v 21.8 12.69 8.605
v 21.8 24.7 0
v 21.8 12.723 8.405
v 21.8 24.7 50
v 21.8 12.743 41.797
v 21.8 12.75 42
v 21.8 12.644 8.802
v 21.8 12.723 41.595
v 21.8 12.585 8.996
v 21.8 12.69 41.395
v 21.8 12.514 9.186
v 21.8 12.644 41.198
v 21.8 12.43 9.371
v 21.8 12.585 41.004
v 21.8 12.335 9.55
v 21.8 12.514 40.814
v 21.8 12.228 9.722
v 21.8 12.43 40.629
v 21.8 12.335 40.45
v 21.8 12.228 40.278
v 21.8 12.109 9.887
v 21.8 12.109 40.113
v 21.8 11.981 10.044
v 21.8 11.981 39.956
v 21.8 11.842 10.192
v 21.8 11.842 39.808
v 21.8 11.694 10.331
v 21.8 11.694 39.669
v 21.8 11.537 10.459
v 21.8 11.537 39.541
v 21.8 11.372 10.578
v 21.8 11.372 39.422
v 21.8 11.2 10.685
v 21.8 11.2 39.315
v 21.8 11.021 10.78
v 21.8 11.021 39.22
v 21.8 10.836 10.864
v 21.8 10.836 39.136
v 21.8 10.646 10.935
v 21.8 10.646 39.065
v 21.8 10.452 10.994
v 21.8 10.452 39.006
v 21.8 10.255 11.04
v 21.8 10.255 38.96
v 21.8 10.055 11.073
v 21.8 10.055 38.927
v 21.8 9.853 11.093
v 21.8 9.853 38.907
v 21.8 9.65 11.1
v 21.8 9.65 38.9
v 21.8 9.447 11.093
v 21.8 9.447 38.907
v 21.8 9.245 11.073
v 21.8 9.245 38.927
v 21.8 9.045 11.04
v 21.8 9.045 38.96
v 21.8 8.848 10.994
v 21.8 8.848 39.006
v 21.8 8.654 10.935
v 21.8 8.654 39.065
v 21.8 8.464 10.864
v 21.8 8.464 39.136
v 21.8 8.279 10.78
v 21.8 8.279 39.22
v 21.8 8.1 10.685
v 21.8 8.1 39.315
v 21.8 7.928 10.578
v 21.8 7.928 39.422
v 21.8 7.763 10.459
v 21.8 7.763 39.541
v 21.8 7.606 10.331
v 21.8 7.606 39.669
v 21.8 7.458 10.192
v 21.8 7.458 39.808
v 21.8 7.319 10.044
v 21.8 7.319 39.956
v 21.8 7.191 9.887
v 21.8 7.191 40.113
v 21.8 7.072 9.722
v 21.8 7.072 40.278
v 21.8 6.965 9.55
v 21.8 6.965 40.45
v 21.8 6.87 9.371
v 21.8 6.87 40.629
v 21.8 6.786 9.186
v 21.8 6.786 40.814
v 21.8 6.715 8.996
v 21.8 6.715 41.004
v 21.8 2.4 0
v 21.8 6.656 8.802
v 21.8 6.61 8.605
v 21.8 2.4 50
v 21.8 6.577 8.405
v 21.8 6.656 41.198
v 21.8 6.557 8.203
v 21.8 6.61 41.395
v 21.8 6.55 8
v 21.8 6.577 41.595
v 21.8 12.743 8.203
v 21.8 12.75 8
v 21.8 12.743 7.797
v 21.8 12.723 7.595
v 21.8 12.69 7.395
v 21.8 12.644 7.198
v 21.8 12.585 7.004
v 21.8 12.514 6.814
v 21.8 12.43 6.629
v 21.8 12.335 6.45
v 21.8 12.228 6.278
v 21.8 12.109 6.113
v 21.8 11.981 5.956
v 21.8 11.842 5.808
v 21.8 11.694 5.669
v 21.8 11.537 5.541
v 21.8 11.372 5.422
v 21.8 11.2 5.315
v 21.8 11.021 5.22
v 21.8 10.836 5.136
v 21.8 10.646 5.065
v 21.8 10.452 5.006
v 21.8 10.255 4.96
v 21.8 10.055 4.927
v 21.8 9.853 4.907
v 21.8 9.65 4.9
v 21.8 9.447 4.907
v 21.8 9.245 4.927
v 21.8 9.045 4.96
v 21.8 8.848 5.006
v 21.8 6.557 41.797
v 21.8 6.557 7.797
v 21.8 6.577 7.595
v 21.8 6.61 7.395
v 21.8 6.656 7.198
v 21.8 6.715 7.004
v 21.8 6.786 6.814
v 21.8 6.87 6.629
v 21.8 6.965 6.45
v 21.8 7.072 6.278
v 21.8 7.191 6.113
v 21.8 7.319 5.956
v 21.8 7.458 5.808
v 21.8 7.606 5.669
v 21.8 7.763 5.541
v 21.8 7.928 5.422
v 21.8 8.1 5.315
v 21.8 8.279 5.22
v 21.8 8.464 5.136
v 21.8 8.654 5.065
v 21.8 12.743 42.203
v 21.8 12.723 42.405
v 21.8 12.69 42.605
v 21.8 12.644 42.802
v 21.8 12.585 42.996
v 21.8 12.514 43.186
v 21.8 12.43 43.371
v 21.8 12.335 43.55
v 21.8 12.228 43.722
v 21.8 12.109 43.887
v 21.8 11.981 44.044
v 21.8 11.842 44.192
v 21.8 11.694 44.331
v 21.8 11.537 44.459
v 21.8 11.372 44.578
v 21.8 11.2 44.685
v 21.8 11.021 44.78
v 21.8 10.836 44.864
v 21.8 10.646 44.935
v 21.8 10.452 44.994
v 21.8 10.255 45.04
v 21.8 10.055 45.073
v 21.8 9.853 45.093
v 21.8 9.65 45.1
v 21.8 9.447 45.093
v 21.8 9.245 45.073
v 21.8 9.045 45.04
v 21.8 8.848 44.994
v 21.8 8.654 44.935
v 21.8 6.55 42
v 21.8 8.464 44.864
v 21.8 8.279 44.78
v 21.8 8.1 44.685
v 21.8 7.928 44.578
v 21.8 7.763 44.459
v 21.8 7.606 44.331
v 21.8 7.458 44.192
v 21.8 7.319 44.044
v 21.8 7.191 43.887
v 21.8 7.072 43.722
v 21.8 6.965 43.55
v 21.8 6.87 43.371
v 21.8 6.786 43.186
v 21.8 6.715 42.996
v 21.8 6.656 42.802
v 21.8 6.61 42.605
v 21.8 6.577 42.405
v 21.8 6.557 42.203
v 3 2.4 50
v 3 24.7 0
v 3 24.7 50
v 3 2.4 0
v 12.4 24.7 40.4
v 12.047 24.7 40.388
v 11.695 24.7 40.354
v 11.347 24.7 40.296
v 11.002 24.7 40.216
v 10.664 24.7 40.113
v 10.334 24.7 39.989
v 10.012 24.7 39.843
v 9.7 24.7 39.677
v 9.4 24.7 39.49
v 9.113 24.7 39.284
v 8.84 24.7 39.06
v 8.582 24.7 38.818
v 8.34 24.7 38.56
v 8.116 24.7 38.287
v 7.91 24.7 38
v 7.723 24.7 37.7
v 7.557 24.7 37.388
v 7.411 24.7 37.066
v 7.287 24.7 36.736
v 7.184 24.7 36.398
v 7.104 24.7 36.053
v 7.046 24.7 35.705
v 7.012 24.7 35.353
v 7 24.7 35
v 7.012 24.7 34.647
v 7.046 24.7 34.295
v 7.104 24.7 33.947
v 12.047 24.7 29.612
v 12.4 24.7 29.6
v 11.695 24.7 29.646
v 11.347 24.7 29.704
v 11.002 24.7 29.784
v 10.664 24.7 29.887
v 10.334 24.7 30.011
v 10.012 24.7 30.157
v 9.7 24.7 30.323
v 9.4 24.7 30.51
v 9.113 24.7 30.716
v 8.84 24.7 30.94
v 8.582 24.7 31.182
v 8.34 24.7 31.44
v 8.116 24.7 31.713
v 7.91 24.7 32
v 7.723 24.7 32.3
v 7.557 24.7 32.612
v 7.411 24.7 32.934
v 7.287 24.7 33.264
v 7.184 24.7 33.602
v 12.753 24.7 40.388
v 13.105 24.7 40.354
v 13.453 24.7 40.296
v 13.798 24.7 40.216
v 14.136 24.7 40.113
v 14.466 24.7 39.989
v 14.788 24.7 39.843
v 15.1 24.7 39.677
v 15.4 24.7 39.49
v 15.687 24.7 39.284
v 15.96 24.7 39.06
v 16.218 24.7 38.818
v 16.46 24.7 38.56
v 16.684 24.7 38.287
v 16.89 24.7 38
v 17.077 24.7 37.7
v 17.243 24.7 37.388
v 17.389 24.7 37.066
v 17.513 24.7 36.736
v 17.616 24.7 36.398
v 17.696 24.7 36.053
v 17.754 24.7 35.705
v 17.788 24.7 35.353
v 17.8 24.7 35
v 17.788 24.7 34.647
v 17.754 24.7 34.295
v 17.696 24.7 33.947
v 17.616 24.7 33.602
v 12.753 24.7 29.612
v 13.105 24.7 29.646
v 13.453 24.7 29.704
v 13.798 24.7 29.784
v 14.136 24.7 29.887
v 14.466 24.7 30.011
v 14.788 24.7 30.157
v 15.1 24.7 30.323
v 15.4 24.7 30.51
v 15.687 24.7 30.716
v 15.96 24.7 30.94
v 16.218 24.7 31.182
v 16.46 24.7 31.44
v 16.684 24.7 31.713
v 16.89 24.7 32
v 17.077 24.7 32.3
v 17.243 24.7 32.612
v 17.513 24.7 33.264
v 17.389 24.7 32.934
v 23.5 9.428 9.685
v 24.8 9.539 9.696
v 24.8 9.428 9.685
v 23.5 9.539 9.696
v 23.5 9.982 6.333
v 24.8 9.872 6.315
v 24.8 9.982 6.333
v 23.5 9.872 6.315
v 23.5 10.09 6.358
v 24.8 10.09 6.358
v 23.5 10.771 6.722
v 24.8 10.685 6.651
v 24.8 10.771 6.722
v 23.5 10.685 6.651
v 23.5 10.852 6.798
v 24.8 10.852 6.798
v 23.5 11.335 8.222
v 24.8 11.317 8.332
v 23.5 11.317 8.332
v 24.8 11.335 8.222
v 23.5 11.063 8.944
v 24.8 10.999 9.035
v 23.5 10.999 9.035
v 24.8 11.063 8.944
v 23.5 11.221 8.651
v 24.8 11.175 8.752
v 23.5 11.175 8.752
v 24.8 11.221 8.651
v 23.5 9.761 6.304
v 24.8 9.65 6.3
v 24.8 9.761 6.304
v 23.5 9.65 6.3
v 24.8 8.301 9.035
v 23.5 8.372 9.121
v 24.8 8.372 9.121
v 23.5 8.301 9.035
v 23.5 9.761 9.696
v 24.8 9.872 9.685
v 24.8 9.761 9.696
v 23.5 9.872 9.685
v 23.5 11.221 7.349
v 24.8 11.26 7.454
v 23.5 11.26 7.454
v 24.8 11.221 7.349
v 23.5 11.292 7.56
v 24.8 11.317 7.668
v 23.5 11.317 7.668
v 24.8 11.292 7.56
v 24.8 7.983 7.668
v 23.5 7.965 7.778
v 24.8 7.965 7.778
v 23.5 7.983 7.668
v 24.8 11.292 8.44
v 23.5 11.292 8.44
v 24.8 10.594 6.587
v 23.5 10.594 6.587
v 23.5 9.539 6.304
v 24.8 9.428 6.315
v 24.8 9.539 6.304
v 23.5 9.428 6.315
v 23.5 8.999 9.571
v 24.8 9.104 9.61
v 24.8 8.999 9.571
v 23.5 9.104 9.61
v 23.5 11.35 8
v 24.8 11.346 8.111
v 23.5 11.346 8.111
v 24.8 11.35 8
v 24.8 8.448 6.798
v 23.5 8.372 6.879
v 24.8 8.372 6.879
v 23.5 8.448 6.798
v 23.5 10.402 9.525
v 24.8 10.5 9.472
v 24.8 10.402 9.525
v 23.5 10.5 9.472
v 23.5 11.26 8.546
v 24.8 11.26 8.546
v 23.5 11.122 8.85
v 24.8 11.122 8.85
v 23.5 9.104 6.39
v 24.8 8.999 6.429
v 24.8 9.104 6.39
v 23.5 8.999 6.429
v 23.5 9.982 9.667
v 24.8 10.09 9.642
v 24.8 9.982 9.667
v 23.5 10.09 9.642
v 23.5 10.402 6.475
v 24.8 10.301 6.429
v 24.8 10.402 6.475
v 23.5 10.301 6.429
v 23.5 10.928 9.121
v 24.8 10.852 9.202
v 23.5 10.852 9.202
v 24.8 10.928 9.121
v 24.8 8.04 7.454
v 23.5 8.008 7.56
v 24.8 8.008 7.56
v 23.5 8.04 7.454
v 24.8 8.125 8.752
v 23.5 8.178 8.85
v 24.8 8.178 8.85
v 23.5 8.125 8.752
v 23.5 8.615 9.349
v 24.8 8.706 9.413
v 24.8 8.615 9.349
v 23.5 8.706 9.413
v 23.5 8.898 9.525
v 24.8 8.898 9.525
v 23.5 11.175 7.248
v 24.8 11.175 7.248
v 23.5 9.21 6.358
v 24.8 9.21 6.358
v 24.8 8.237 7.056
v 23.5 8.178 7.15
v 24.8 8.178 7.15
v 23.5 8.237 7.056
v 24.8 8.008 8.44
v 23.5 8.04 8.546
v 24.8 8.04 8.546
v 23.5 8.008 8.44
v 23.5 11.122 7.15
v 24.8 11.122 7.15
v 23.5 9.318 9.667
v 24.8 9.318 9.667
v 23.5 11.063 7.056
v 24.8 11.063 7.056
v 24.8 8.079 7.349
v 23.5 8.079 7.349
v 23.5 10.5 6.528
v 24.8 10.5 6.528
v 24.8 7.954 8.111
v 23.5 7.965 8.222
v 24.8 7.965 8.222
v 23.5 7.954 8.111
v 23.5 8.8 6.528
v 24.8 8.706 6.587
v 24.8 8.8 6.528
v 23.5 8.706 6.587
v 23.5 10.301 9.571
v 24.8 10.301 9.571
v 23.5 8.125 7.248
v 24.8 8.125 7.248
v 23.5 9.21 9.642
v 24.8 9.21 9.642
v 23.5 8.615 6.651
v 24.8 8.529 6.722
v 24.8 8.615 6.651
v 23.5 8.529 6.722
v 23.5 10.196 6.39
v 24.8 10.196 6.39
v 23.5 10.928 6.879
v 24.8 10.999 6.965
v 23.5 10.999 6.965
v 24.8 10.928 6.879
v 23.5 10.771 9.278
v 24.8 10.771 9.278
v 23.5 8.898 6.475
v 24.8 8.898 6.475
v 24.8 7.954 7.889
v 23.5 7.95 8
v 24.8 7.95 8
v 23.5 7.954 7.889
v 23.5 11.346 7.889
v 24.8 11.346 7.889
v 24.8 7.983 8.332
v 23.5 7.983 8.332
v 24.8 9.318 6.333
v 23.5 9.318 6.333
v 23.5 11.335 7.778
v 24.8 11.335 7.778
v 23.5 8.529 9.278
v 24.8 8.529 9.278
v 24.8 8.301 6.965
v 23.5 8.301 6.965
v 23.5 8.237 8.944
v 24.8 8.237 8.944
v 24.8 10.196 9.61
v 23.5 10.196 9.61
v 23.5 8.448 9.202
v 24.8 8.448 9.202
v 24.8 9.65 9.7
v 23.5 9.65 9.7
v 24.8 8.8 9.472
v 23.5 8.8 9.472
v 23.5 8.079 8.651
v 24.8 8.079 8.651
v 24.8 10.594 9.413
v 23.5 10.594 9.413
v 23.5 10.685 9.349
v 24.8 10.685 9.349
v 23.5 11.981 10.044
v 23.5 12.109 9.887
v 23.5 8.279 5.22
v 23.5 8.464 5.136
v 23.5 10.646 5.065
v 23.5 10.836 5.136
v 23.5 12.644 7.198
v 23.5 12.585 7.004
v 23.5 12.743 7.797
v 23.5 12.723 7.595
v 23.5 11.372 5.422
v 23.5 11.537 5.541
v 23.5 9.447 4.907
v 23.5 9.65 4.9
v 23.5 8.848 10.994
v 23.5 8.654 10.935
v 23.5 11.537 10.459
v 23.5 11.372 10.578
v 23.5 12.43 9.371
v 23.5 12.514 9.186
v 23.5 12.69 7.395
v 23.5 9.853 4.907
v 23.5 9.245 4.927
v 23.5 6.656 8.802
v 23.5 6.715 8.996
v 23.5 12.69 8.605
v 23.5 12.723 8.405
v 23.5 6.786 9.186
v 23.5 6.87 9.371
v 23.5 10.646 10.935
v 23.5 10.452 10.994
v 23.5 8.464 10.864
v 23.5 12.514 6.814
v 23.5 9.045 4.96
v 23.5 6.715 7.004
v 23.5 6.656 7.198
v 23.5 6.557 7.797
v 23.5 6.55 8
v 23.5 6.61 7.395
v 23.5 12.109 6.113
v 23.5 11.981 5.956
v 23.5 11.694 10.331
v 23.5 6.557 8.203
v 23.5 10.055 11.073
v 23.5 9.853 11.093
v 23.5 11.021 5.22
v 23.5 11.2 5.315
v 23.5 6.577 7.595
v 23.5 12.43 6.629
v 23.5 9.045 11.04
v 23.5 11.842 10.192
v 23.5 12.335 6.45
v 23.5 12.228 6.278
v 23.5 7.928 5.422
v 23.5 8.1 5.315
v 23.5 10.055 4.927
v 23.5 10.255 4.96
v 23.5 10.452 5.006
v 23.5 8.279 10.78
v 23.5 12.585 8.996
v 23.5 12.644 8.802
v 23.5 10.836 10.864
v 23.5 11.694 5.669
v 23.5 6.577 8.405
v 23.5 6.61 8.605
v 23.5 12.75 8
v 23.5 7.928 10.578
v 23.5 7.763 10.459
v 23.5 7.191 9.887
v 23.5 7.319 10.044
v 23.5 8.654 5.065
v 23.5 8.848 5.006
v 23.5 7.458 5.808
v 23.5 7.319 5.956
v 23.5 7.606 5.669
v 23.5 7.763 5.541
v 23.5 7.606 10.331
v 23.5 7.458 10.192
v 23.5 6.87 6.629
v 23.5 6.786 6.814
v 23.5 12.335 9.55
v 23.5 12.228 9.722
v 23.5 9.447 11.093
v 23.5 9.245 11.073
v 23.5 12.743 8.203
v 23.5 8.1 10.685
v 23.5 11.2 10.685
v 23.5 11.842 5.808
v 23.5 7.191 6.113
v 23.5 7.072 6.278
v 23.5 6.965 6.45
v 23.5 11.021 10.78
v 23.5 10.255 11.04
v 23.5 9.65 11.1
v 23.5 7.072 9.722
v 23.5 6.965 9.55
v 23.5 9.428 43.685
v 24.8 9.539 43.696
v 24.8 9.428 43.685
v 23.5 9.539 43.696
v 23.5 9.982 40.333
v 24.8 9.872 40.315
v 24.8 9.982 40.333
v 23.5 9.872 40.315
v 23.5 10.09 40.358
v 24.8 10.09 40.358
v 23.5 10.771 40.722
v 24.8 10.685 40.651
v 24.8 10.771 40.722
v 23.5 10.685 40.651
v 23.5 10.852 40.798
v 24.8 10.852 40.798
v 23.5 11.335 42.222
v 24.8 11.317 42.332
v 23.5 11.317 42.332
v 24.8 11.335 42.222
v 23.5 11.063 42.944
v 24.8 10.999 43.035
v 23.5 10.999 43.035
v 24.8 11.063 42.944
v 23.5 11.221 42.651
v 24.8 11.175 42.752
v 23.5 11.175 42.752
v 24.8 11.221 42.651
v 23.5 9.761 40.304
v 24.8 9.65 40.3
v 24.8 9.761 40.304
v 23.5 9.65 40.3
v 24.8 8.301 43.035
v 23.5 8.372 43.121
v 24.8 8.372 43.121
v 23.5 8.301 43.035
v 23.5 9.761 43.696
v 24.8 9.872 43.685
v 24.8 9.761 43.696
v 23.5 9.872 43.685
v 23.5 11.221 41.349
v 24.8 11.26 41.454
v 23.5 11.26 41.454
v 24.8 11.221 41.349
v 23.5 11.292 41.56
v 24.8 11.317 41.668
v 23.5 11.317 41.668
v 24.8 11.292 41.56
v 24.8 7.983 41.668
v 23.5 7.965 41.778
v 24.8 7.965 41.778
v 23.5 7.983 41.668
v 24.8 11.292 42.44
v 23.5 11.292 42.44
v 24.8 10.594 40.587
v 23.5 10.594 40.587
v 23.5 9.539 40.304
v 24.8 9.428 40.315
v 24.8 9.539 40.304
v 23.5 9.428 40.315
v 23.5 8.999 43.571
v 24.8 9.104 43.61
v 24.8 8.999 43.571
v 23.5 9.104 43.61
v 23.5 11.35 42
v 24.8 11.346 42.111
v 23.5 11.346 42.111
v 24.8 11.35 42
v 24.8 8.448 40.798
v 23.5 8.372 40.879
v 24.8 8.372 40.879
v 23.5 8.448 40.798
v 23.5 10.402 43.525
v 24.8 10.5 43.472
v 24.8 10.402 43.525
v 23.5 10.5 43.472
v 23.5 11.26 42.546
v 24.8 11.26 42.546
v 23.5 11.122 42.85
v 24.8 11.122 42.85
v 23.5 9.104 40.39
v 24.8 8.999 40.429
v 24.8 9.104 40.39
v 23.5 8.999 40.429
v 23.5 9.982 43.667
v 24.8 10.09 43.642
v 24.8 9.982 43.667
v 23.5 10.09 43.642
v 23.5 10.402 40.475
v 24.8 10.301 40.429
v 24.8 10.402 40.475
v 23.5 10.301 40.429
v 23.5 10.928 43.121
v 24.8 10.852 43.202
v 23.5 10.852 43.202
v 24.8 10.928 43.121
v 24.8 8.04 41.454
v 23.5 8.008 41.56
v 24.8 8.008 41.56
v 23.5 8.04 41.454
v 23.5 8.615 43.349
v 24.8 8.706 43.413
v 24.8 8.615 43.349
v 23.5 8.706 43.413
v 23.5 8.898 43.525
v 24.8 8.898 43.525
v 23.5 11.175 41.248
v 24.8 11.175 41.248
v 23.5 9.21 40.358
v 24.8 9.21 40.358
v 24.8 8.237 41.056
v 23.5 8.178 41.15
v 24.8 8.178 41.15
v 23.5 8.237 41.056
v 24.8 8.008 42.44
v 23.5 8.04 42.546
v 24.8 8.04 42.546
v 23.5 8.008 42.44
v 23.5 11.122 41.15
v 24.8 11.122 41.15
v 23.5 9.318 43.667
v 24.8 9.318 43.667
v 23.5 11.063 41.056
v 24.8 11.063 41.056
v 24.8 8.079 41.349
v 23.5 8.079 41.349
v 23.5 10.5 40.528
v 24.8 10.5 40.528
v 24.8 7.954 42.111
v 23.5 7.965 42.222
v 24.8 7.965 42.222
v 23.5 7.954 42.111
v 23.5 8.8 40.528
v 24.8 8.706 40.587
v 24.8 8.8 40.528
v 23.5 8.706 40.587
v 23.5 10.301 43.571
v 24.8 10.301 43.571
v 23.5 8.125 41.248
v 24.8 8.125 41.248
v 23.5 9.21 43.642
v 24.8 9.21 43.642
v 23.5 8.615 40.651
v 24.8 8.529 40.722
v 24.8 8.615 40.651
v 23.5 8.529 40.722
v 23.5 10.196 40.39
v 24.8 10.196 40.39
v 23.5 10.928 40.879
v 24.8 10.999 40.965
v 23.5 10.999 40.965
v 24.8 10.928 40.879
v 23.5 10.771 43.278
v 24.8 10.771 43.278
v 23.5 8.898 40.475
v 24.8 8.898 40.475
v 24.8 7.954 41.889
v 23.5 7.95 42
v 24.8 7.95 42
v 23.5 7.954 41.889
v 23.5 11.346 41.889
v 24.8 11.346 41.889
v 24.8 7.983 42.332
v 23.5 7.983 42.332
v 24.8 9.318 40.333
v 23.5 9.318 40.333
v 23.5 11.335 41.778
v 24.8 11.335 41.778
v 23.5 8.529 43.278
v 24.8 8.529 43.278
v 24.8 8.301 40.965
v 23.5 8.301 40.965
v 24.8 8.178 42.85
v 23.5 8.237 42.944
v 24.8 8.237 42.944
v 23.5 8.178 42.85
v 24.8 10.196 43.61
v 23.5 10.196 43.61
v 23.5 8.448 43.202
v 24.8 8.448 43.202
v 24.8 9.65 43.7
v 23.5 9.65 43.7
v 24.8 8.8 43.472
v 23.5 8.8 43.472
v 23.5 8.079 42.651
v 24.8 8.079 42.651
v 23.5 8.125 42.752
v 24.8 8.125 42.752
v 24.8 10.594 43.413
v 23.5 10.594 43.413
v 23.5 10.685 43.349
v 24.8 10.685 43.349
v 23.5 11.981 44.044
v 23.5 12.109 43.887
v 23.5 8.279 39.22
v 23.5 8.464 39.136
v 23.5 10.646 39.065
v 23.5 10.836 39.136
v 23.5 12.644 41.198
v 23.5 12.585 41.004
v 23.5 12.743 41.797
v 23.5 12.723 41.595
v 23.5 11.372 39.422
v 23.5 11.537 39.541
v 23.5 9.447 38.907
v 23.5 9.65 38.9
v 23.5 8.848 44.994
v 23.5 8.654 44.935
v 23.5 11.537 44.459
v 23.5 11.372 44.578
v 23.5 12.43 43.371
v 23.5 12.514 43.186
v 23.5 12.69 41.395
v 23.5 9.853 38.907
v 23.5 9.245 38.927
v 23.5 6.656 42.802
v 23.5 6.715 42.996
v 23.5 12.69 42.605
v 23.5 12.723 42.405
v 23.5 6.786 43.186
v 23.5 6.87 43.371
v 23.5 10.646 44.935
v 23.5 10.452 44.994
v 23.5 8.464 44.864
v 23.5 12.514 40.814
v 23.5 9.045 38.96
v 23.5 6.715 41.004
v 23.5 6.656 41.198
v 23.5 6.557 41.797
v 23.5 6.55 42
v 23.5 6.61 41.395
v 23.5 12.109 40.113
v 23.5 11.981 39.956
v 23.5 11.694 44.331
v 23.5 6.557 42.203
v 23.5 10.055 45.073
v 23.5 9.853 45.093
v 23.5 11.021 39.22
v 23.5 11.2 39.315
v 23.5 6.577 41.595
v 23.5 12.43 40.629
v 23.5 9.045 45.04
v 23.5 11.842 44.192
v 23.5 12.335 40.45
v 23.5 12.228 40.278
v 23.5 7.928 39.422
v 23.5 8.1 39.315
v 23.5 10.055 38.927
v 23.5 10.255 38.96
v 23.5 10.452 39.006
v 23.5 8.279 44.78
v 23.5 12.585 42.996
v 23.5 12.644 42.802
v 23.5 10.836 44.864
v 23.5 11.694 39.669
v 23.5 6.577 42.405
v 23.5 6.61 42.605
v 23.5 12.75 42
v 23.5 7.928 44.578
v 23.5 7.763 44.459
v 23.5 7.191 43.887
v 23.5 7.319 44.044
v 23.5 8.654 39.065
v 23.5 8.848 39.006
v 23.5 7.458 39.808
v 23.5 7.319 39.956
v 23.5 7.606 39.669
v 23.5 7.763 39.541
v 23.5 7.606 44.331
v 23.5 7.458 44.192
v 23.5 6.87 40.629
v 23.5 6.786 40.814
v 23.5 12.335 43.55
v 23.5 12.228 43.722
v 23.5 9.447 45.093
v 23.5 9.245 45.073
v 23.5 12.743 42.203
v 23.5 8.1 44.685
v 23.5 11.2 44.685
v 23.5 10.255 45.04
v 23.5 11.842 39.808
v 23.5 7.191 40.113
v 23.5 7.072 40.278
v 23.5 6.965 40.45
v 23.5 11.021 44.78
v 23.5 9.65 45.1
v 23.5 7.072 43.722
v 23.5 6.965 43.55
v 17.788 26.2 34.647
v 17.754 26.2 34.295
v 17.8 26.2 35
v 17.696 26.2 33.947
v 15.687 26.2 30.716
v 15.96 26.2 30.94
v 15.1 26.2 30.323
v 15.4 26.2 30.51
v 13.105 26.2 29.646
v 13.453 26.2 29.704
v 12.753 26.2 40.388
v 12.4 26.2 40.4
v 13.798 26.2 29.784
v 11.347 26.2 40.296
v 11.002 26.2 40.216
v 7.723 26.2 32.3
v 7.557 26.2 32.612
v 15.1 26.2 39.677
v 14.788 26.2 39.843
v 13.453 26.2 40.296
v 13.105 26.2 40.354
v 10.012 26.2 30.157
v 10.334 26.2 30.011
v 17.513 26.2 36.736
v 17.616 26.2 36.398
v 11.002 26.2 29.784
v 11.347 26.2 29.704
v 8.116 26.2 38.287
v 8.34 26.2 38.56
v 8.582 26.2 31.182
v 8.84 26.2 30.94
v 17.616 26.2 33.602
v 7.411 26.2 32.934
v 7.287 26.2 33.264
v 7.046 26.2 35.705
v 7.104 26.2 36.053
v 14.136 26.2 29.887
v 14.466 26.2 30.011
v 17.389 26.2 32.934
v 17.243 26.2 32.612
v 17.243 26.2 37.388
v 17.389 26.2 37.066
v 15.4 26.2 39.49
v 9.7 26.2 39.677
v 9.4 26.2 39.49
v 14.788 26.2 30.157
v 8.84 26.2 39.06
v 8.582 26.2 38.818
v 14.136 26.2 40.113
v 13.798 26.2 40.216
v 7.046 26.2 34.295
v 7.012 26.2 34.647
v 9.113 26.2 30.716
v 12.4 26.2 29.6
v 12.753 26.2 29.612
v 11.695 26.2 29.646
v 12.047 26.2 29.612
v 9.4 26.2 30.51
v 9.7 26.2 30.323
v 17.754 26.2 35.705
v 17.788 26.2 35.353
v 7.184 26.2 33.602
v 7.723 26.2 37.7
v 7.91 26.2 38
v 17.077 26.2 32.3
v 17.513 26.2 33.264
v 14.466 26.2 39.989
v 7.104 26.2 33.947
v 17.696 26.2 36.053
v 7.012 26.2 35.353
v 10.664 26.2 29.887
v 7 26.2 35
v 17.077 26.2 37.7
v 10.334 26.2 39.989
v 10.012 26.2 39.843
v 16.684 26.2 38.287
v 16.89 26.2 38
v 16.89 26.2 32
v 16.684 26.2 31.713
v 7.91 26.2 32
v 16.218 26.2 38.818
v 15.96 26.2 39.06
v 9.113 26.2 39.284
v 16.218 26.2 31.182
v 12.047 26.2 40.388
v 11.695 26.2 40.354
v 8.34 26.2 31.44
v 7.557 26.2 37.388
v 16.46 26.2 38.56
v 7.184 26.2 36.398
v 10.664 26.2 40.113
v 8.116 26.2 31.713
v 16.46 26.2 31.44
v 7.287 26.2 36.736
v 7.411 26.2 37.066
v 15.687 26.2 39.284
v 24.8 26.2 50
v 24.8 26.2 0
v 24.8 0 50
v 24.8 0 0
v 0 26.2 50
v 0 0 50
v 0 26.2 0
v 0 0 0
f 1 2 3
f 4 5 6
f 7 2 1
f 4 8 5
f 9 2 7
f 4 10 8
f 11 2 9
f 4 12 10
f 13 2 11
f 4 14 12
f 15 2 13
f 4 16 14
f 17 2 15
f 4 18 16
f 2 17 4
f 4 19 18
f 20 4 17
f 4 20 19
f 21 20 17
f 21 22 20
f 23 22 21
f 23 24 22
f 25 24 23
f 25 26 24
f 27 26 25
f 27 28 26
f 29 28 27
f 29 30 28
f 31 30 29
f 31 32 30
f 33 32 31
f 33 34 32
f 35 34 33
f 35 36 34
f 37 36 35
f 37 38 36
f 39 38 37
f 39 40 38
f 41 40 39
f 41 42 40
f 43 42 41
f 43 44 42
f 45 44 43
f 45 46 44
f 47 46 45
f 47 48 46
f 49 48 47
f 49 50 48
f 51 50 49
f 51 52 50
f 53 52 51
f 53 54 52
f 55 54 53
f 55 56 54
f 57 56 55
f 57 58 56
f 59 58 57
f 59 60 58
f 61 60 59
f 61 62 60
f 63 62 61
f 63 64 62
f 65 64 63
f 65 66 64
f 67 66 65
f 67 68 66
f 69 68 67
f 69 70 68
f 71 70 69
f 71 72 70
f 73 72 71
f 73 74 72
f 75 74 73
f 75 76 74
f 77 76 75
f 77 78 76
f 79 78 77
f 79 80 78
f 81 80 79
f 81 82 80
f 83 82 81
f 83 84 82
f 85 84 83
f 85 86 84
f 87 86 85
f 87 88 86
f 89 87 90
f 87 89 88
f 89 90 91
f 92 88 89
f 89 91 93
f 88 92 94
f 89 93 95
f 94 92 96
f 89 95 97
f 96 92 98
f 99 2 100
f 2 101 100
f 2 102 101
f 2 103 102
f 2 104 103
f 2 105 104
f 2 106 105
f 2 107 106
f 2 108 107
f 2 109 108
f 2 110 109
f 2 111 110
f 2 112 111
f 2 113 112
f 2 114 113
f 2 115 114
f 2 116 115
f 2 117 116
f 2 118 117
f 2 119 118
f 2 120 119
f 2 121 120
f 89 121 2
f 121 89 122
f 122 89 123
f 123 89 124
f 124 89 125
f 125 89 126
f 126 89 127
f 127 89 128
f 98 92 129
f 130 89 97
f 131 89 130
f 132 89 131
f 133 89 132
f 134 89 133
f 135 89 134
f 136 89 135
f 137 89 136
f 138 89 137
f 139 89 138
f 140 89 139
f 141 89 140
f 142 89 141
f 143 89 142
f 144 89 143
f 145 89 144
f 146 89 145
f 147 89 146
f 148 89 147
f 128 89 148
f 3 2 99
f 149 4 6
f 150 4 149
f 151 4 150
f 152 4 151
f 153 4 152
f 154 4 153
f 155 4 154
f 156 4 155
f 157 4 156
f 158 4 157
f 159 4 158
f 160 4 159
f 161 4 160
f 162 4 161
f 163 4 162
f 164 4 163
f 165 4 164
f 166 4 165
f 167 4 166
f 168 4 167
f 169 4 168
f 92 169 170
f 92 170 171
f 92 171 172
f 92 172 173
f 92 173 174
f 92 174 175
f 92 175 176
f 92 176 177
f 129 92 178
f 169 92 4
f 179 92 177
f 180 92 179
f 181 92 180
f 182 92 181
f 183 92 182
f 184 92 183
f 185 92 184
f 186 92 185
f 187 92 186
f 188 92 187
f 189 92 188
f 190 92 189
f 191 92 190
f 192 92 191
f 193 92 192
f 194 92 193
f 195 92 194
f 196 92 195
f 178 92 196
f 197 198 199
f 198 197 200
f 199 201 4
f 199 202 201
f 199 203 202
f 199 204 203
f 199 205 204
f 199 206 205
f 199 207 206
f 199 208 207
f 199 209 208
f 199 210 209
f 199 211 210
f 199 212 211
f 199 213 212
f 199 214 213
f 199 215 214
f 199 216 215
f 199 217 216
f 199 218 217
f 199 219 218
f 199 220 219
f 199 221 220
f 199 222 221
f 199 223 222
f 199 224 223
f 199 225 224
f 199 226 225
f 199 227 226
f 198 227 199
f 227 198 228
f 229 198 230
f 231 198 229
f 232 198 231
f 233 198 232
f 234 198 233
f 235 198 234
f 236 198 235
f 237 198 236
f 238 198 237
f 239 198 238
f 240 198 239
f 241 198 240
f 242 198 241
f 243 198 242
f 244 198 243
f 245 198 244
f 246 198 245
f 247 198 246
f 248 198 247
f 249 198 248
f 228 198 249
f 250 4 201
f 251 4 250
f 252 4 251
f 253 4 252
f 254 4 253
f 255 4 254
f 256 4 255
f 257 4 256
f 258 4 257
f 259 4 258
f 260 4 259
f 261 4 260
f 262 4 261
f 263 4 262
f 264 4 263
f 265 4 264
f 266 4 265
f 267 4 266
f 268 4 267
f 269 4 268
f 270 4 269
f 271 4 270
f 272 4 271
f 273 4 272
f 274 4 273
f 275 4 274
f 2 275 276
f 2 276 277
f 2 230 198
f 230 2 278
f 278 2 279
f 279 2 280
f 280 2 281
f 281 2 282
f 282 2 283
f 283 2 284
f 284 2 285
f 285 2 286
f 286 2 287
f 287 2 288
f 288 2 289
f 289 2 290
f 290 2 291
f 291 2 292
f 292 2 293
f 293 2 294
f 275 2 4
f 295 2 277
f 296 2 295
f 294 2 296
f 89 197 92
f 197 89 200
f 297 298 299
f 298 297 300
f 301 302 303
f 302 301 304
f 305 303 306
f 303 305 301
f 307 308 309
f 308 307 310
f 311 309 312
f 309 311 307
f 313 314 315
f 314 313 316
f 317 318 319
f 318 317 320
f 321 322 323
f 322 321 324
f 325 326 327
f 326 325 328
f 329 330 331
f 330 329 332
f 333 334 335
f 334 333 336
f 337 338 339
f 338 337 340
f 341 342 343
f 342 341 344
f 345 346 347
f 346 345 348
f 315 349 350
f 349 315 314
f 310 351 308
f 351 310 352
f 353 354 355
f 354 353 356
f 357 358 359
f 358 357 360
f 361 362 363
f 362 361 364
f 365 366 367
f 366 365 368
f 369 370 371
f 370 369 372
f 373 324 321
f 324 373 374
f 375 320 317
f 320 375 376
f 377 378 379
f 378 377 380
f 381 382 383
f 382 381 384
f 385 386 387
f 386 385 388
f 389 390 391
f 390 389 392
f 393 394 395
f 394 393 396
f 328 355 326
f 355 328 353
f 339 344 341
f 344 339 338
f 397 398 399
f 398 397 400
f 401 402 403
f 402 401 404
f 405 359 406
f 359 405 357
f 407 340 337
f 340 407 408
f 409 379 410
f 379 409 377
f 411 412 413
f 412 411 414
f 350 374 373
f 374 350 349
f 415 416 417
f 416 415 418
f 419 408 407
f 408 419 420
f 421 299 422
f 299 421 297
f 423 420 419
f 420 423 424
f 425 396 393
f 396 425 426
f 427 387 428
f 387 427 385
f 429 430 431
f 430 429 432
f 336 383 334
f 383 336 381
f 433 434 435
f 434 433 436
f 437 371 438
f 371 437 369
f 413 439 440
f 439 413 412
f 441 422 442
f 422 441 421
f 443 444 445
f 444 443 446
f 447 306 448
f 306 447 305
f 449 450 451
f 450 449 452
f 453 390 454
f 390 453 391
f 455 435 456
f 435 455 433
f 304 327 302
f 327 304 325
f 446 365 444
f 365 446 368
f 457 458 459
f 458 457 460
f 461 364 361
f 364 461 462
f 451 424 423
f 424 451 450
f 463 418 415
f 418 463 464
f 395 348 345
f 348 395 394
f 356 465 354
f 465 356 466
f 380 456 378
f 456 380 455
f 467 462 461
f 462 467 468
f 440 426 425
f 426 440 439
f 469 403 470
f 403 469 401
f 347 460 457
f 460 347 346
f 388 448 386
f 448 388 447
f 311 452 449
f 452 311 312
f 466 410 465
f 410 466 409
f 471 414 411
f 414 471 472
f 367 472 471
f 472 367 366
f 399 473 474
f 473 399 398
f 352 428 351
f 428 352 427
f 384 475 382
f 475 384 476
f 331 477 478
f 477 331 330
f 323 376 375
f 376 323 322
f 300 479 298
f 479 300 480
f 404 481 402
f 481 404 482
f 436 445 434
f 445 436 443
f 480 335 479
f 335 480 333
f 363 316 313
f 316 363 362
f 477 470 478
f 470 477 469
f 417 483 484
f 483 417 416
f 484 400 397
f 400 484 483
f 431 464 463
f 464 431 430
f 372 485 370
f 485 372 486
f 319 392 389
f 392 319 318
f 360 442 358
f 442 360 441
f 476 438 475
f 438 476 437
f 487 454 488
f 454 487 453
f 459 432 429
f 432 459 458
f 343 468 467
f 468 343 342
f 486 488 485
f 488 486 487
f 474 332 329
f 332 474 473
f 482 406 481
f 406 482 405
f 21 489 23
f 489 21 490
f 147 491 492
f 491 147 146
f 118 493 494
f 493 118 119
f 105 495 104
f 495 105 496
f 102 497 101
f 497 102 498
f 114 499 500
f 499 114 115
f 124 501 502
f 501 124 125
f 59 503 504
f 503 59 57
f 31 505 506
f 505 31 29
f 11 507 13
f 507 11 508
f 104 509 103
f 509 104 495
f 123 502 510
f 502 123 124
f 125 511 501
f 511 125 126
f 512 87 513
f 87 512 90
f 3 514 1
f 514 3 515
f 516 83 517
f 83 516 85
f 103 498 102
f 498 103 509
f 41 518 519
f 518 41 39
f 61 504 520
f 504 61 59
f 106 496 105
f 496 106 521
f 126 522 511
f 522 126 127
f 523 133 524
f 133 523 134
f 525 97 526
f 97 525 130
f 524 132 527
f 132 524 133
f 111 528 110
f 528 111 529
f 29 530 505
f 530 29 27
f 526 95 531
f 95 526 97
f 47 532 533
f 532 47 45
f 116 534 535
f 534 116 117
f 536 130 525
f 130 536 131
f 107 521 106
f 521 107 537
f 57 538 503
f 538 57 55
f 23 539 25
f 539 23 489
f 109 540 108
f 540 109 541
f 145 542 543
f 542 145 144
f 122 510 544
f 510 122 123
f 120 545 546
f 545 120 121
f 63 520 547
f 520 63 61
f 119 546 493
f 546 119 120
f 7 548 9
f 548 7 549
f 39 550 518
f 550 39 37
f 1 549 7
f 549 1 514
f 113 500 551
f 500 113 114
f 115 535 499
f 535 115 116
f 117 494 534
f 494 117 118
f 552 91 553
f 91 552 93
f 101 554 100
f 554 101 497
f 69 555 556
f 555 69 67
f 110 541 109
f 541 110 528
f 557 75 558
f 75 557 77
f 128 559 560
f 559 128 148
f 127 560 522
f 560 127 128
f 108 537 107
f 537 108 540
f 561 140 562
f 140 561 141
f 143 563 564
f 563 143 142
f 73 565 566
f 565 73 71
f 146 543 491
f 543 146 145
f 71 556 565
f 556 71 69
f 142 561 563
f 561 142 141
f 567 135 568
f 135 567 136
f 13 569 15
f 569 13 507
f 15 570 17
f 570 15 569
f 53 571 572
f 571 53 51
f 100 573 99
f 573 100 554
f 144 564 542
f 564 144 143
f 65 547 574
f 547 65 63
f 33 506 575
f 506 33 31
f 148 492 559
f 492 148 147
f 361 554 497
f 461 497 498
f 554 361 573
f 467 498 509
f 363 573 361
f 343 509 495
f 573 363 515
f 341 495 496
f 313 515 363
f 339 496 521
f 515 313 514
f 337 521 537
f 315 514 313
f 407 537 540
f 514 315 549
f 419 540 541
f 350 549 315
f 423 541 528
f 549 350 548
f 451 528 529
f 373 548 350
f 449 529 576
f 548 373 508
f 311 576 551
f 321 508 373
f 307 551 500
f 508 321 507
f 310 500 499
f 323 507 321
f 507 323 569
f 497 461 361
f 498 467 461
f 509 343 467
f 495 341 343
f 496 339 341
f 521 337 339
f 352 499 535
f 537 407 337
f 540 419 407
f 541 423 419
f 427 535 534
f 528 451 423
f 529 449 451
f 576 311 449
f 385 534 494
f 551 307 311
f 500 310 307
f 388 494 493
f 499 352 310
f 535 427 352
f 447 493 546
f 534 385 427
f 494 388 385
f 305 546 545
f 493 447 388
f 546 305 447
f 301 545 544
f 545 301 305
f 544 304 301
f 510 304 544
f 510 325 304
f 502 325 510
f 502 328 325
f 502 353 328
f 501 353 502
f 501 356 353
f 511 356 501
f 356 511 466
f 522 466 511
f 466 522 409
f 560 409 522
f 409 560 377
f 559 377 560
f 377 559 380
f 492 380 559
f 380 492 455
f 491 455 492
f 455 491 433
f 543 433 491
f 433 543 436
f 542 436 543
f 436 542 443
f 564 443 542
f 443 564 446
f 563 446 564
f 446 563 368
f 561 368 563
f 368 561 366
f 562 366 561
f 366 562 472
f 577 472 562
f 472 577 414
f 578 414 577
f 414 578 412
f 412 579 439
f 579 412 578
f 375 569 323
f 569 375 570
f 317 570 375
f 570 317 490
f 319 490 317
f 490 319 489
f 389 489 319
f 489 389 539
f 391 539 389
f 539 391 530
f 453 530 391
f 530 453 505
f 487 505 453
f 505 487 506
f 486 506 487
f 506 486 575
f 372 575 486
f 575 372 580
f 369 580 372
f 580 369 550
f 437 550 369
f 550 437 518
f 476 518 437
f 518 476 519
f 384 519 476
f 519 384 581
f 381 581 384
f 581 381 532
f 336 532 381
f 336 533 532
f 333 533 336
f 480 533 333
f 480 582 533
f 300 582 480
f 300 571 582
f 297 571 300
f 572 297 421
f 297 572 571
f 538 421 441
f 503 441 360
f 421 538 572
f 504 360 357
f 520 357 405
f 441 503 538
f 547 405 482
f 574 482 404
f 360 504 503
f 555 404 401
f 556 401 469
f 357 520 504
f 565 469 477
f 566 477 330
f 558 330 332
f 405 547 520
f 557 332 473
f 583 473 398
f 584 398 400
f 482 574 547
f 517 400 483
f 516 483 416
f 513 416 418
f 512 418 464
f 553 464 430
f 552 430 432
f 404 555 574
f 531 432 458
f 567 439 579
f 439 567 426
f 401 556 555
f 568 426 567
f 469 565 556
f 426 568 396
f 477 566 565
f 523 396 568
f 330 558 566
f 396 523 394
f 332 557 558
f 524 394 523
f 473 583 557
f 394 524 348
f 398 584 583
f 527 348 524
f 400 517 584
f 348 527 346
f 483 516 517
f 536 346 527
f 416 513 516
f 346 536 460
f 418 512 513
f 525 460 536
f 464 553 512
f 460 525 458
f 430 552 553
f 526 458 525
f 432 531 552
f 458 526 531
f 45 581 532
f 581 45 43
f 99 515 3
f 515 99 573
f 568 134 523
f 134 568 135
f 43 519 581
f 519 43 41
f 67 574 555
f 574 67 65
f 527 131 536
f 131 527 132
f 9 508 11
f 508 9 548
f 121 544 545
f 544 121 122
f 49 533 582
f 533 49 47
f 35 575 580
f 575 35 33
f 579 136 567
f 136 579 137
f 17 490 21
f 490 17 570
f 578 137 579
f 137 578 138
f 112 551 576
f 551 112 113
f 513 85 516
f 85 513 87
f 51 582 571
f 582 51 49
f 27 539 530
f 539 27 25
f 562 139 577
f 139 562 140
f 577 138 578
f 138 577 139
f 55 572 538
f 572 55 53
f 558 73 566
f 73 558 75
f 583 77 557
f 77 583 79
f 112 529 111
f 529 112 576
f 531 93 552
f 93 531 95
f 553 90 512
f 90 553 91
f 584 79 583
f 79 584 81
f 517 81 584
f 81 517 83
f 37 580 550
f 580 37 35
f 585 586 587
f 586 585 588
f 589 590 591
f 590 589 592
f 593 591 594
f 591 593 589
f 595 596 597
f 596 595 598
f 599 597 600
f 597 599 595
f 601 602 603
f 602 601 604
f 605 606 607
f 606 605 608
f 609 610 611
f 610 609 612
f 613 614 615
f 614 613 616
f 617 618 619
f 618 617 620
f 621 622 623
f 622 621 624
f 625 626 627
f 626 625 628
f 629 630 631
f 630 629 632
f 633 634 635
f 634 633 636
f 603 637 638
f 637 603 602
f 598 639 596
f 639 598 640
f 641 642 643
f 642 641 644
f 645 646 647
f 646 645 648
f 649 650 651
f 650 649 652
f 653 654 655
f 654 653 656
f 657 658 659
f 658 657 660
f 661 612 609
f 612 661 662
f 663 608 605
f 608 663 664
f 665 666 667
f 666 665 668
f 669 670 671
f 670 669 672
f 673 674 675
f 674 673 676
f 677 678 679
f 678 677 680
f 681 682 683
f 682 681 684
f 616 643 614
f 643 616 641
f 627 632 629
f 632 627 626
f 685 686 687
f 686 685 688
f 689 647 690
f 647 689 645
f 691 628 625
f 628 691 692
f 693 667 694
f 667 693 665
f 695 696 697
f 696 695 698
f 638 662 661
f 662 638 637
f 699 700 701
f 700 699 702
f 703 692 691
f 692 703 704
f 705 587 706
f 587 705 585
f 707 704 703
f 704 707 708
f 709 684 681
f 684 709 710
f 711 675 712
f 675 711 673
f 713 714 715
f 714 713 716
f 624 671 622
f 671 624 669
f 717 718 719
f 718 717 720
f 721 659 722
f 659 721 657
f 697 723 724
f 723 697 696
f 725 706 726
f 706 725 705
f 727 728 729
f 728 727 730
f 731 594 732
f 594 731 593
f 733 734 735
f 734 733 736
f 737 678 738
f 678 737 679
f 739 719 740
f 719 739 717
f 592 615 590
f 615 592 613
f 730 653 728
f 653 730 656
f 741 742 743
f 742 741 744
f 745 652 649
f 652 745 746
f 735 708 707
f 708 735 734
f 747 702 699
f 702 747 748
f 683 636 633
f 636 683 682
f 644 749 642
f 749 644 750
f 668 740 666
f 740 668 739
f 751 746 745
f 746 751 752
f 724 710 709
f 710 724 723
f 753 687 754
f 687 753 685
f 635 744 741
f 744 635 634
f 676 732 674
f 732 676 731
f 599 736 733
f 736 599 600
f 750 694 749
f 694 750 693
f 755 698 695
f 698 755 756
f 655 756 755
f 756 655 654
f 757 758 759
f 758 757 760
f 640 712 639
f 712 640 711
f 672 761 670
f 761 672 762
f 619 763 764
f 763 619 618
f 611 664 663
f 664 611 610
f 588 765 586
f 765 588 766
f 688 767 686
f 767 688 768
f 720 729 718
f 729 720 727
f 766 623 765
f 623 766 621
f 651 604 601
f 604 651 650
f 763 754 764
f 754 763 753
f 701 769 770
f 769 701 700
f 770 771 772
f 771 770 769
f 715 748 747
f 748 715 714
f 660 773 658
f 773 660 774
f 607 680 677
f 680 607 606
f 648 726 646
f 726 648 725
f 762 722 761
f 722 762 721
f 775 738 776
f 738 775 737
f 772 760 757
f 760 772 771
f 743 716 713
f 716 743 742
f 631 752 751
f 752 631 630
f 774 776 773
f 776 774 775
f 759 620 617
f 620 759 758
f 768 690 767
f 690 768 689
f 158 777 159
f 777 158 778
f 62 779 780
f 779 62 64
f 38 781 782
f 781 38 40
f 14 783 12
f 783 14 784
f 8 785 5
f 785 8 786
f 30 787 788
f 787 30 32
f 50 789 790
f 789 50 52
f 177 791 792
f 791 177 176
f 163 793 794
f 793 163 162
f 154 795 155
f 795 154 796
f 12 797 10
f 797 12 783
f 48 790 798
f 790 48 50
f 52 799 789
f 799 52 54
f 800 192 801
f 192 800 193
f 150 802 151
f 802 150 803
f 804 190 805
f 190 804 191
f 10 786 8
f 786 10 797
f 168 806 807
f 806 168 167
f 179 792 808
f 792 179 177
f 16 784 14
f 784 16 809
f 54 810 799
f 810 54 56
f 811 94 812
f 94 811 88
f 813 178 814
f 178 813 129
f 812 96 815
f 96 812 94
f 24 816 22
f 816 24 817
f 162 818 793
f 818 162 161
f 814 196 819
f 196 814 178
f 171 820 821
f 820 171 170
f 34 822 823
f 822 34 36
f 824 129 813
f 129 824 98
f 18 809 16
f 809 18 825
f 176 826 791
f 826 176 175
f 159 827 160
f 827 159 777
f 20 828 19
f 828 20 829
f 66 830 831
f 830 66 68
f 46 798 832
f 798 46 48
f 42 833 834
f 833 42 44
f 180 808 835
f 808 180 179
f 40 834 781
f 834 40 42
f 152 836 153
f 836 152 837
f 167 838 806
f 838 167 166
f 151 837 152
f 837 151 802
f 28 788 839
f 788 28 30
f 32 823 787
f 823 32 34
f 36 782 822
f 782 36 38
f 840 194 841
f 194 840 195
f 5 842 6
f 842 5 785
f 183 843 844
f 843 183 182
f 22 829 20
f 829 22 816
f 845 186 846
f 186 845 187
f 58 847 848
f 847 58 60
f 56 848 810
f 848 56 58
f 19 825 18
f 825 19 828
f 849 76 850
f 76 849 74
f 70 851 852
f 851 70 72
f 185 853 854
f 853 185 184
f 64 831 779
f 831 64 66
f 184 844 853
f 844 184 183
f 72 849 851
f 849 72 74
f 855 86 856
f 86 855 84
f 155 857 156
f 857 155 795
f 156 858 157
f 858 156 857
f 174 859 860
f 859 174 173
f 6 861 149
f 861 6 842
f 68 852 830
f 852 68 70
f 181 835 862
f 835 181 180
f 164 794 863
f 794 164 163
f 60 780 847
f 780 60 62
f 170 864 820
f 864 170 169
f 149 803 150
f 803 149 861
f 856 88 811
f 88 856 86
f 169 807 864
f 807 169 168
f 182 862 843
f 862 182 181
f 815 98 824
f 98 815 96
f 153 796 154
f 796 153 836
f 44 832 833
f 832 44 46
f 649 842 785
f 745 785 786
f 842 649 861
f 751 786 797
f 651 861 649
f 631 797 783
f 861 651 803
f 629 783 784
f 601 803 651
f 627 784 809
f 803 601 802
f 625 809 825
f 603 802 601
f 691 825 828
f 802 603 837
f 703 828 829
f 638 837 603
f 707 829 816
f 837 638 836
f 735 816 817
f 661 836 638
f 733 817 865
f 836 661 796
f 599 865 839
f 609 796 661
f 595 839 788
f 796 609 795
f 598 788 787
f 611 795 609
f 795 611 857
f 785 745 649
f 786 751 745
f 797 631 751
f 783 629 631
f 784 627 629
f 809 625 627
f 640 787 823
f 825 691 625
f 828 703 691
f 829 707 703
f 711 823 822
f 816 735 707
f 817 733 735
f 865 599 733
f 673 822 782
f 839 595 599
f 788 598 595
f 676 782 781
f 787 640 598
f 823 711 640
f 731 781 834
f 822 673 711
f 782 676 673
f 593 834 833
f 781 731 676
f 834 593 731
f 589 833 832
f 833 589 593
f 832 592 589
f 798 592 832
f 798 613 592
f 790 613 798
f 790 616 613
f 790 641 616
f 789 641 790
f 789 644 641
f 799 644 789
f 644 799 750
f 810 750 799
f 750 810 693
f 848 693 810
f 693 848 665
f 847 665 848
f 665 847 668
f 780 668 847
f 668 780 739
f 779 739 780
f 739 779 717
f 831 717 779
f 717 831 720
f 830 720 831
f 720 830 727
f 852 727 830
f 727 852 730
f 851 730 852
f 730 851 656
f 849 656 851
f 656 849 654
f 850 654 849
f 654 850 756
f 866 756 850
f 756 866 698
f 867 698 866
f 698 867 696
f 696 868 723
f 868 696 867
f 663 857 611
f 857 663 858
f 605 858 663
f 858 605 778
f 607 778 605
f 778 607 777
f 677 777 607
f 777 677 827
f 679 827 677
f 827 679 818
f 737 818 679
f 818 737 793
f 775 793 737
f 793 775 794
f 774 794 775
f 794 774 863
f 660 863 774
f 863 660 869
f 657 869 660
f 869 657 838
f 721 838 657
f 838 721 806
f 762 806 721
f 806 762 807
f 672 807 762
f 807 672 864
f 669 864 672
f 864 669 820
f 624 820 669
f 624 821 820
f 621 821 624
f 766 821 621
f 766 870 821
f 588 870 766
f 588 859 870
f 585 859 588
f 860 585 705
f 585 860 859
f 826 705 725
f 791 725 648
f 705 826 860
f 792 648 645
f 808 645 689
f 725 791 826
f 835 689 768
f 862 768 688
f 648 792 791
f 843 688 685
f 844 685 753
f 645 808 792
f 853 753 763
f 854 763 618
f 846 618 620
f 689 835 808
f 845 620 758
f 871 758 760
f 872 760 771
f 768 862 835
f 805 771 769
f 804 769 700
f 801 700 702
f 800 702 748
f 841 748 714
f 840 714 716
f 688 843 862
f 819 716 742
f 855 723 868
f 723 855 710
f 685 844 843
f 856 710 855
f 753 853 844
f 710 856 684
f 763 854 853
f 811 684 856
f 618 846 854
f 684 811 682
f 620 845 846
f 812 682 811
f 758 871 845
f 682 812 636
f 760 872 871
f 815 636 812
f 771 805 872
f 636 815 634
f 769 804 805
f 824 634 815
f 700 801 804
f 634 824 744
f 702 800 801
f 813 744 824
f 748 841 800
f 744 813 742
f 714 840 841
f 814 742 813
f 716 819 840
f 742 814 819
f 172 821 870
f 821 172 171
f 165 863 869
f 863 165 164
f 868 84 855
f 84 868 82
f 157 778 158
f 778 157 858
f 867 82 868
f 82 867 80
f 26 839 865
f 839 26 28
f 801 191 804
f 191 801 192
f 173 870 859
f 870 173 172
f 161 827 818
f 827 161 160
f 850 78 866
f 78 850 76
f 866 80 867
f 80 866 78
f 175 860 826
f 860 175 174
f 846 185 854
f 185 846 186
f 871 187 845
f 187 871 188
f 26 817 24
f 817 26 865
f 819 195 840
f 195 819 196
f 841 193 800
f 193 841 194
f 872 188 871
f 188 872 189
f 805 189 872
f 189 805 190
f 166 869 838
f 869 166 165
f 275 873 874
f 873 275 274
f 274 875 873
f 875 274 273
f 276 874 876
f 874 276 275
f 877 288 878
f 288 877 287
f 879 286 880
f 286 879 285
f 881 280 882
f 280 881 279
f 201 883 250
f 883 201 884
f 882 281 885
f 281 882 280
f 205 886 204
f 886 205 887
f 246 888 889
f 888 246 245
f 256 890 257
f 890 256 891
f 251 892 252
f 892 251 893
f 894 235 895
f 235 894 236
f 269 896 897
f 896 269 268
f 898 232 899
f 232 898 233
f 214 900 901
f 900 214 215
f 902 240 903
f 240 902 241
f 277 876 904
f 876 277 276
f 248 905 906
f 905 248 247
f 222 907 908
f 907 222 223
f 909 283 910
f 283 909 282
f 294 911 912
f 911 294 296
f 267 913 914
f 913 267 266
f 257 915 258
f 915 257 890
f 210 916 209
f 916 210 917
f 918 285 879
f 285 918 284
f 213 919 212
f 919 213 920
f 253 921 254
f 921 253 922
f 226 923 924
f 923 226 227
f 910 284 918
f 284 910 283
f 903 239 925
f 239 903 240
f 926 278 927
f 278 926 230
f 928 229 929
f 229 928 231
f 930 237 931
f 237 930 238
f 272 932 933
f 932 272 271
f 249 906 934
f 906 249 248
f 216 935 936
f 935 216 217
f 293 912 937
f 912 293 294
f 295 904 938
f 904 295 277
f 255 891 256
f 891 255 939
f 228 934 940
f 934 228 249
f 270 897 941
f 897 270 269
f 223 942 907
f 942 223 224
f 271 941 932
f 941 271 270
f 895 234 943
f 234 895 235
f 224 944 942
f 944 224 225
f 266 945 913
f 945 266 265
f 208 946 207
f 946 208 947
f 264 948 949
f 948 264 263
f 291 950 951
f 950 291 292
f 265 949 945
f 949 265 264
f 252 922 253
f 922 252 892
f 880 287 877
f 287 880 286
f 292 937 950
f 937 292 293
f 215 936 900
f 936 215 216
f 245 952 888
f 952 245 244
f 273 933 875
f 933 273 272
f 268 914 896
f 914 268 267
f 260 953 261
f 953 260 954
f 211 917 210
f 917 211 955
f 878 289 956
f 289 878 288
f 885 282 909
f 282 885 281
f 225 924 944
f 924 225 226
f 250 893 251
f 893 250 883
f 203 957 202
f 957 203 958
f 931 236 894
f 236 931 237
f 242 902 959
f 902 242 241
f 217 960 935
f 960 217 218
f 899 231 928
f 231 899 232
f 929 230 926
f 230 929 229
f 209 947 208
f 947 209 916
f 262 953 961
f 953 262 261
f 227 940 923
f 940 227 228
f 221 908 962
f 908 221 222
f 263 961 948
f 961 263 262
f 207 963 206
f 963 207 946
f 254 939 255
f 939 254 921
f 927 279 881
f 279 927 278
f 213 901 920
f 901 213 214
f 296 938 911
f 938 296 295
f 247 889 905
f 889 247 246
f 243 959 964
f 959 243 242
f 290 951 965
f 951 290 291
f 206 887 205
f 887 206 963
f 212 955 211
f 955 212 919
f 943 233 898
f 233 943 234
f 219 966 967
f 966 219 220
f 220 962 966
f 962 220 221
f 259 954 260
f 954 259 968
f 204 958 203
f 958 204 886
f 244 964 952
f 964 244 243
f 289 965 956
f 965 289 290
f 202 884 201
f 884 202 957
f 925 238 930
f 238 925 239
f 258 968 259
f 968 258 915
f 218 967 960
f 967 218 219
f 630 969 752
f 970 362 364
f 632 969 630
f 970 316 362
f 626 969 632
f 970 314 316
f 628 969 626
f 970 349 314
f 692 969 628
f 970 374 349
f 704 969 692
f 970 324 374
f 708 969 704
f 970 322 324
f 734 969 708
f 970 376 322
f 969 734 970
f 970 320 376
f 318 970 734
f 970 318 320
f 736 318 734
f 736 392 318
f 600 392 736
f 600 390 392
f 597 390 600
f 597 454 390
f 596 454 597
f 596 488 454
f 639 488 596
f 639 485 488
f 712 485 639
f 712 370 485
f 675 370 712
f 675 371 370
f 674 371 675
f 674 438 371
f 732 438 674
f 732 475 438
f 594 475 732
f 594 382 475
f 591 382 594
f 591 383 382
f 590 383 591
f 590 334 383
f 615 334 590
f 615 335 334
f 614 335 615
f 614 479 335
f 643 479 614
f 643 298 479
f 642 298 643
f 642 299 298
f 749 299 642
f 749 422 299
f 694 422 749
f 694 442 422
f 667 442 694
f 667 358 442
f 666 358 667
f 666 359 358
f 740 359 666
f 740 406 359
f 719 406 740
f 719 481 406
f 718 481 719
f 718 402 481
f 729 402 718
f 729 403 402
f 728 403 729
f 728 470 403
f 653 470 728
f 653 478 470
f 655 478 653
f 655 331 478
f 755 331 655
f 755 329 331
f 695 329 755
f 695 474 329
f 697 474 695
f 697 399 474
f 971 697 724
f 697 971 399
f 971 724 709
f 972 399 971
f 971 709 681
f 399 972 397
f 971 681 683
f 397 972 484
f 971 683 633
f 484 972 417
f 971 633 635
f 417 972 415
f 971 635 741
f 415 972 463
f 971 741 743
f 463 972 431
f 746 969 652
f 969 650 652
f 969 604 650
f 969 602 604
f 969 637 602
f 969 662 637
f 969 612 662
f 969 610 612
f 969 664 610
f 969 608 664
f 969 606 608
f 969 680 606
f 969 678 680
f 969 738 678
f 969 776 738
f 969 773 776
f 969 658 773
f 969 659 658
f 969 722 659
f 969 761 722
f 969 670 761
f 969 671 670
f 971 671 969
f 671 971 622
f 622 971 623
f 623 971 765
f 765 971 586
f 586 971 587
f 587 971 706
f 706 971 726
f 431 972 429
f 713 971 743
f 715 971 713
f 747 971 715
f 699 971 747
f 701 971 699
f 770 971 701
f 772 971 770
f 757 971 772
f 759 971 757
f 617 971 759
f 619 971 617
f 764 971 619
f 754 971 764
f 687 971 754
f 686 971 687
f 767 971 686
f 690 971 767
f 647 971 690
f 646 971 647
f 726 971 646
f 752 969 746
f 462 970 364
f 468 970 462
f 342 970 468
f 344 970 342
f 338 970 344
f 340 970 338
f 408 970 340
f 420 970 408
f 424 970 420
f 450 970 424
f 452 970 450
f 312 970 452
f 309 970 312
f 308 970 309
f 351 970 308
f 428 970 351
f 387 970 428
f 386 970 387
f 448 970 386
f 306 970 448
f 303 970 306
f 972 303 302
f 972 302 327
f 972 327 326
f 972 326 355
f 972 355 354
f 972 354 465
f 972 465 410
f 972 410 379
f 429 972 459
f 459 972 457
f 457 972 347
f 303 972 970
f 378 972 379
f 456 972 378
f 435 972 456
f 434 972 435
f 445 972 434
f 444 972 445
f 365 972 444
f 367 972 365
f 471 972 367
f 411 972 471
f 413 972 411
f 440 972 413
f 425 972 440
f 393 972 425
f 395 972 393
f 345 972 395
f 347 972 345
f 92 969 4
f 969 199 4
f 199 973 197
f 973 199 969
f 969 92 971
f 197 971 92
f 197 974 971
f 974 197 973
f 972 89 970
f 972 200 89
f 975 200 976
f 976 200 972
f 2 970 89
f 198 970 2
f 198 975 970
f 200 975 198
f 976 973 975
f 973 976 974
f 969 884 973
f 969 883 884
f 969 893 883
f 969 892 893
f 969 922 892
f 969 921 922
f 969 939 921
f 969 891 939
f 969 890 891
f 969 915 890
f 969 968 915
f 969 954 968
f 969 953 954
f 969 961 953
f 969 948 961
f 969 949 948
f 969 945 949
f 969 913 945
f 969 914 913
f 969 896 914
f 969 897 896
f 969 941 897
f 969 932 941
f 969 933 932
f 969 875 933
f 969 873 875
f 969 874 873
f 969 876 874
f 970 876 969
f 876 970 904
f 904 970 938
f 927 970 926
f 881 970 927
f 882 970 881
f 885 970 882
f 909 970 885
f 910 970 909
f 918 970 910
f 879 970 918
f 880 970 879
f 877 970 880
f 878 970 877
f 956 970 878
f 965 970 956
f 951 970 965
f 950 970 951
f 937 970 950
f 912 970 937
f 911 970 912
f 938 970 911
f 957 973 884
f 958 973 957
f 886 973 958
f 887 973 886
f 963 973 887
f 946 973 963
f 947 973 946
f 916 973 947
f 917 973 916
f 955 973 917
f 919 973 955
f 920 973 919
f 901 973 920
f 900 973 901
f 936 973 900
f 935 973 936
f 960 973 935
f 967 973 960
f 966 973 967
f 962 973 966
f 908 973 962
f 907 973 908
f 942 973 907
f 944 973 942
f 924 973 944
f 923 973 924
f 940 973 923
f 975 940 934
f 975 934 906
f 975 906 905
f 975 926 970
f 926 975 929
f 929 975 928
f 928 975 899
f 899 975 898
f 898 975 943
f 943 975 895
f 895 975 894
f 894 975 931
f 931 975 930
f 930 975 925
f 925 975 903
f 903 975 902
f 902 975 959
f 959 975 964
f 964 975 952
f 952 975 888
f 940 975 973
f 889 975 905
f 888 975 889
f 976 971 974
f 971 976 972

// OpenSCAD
$fn=96;

module part() {
difference() {
union() {
    translate([0,0,0]) cube([24.8,26.2,50]);
}
union() {
    translate([3,2.4,-1]) cube([18.8,22.3,52]);
    translate([21.7,9.65,8]) rotate([0,90,0]) cylinder(r=1.7,h=3.2);
    translate([21.7,9.65,8]) rotate([0,90,0]) cylinder(r=3.1,h=1.8);
    translate([21.7,9.65,42]) rotate([0,90,0]) cylinder(r=1.7,h=3.2);
    translate([21.7,9.65,42]) rotate([0,90,0]) cylinder(r=3.1,h=1.8);
    translate([12.4,24.6,35]) rotate([-90,0,0]) cylinder(r=5.4,h=1.7);
}
}
}

part();
